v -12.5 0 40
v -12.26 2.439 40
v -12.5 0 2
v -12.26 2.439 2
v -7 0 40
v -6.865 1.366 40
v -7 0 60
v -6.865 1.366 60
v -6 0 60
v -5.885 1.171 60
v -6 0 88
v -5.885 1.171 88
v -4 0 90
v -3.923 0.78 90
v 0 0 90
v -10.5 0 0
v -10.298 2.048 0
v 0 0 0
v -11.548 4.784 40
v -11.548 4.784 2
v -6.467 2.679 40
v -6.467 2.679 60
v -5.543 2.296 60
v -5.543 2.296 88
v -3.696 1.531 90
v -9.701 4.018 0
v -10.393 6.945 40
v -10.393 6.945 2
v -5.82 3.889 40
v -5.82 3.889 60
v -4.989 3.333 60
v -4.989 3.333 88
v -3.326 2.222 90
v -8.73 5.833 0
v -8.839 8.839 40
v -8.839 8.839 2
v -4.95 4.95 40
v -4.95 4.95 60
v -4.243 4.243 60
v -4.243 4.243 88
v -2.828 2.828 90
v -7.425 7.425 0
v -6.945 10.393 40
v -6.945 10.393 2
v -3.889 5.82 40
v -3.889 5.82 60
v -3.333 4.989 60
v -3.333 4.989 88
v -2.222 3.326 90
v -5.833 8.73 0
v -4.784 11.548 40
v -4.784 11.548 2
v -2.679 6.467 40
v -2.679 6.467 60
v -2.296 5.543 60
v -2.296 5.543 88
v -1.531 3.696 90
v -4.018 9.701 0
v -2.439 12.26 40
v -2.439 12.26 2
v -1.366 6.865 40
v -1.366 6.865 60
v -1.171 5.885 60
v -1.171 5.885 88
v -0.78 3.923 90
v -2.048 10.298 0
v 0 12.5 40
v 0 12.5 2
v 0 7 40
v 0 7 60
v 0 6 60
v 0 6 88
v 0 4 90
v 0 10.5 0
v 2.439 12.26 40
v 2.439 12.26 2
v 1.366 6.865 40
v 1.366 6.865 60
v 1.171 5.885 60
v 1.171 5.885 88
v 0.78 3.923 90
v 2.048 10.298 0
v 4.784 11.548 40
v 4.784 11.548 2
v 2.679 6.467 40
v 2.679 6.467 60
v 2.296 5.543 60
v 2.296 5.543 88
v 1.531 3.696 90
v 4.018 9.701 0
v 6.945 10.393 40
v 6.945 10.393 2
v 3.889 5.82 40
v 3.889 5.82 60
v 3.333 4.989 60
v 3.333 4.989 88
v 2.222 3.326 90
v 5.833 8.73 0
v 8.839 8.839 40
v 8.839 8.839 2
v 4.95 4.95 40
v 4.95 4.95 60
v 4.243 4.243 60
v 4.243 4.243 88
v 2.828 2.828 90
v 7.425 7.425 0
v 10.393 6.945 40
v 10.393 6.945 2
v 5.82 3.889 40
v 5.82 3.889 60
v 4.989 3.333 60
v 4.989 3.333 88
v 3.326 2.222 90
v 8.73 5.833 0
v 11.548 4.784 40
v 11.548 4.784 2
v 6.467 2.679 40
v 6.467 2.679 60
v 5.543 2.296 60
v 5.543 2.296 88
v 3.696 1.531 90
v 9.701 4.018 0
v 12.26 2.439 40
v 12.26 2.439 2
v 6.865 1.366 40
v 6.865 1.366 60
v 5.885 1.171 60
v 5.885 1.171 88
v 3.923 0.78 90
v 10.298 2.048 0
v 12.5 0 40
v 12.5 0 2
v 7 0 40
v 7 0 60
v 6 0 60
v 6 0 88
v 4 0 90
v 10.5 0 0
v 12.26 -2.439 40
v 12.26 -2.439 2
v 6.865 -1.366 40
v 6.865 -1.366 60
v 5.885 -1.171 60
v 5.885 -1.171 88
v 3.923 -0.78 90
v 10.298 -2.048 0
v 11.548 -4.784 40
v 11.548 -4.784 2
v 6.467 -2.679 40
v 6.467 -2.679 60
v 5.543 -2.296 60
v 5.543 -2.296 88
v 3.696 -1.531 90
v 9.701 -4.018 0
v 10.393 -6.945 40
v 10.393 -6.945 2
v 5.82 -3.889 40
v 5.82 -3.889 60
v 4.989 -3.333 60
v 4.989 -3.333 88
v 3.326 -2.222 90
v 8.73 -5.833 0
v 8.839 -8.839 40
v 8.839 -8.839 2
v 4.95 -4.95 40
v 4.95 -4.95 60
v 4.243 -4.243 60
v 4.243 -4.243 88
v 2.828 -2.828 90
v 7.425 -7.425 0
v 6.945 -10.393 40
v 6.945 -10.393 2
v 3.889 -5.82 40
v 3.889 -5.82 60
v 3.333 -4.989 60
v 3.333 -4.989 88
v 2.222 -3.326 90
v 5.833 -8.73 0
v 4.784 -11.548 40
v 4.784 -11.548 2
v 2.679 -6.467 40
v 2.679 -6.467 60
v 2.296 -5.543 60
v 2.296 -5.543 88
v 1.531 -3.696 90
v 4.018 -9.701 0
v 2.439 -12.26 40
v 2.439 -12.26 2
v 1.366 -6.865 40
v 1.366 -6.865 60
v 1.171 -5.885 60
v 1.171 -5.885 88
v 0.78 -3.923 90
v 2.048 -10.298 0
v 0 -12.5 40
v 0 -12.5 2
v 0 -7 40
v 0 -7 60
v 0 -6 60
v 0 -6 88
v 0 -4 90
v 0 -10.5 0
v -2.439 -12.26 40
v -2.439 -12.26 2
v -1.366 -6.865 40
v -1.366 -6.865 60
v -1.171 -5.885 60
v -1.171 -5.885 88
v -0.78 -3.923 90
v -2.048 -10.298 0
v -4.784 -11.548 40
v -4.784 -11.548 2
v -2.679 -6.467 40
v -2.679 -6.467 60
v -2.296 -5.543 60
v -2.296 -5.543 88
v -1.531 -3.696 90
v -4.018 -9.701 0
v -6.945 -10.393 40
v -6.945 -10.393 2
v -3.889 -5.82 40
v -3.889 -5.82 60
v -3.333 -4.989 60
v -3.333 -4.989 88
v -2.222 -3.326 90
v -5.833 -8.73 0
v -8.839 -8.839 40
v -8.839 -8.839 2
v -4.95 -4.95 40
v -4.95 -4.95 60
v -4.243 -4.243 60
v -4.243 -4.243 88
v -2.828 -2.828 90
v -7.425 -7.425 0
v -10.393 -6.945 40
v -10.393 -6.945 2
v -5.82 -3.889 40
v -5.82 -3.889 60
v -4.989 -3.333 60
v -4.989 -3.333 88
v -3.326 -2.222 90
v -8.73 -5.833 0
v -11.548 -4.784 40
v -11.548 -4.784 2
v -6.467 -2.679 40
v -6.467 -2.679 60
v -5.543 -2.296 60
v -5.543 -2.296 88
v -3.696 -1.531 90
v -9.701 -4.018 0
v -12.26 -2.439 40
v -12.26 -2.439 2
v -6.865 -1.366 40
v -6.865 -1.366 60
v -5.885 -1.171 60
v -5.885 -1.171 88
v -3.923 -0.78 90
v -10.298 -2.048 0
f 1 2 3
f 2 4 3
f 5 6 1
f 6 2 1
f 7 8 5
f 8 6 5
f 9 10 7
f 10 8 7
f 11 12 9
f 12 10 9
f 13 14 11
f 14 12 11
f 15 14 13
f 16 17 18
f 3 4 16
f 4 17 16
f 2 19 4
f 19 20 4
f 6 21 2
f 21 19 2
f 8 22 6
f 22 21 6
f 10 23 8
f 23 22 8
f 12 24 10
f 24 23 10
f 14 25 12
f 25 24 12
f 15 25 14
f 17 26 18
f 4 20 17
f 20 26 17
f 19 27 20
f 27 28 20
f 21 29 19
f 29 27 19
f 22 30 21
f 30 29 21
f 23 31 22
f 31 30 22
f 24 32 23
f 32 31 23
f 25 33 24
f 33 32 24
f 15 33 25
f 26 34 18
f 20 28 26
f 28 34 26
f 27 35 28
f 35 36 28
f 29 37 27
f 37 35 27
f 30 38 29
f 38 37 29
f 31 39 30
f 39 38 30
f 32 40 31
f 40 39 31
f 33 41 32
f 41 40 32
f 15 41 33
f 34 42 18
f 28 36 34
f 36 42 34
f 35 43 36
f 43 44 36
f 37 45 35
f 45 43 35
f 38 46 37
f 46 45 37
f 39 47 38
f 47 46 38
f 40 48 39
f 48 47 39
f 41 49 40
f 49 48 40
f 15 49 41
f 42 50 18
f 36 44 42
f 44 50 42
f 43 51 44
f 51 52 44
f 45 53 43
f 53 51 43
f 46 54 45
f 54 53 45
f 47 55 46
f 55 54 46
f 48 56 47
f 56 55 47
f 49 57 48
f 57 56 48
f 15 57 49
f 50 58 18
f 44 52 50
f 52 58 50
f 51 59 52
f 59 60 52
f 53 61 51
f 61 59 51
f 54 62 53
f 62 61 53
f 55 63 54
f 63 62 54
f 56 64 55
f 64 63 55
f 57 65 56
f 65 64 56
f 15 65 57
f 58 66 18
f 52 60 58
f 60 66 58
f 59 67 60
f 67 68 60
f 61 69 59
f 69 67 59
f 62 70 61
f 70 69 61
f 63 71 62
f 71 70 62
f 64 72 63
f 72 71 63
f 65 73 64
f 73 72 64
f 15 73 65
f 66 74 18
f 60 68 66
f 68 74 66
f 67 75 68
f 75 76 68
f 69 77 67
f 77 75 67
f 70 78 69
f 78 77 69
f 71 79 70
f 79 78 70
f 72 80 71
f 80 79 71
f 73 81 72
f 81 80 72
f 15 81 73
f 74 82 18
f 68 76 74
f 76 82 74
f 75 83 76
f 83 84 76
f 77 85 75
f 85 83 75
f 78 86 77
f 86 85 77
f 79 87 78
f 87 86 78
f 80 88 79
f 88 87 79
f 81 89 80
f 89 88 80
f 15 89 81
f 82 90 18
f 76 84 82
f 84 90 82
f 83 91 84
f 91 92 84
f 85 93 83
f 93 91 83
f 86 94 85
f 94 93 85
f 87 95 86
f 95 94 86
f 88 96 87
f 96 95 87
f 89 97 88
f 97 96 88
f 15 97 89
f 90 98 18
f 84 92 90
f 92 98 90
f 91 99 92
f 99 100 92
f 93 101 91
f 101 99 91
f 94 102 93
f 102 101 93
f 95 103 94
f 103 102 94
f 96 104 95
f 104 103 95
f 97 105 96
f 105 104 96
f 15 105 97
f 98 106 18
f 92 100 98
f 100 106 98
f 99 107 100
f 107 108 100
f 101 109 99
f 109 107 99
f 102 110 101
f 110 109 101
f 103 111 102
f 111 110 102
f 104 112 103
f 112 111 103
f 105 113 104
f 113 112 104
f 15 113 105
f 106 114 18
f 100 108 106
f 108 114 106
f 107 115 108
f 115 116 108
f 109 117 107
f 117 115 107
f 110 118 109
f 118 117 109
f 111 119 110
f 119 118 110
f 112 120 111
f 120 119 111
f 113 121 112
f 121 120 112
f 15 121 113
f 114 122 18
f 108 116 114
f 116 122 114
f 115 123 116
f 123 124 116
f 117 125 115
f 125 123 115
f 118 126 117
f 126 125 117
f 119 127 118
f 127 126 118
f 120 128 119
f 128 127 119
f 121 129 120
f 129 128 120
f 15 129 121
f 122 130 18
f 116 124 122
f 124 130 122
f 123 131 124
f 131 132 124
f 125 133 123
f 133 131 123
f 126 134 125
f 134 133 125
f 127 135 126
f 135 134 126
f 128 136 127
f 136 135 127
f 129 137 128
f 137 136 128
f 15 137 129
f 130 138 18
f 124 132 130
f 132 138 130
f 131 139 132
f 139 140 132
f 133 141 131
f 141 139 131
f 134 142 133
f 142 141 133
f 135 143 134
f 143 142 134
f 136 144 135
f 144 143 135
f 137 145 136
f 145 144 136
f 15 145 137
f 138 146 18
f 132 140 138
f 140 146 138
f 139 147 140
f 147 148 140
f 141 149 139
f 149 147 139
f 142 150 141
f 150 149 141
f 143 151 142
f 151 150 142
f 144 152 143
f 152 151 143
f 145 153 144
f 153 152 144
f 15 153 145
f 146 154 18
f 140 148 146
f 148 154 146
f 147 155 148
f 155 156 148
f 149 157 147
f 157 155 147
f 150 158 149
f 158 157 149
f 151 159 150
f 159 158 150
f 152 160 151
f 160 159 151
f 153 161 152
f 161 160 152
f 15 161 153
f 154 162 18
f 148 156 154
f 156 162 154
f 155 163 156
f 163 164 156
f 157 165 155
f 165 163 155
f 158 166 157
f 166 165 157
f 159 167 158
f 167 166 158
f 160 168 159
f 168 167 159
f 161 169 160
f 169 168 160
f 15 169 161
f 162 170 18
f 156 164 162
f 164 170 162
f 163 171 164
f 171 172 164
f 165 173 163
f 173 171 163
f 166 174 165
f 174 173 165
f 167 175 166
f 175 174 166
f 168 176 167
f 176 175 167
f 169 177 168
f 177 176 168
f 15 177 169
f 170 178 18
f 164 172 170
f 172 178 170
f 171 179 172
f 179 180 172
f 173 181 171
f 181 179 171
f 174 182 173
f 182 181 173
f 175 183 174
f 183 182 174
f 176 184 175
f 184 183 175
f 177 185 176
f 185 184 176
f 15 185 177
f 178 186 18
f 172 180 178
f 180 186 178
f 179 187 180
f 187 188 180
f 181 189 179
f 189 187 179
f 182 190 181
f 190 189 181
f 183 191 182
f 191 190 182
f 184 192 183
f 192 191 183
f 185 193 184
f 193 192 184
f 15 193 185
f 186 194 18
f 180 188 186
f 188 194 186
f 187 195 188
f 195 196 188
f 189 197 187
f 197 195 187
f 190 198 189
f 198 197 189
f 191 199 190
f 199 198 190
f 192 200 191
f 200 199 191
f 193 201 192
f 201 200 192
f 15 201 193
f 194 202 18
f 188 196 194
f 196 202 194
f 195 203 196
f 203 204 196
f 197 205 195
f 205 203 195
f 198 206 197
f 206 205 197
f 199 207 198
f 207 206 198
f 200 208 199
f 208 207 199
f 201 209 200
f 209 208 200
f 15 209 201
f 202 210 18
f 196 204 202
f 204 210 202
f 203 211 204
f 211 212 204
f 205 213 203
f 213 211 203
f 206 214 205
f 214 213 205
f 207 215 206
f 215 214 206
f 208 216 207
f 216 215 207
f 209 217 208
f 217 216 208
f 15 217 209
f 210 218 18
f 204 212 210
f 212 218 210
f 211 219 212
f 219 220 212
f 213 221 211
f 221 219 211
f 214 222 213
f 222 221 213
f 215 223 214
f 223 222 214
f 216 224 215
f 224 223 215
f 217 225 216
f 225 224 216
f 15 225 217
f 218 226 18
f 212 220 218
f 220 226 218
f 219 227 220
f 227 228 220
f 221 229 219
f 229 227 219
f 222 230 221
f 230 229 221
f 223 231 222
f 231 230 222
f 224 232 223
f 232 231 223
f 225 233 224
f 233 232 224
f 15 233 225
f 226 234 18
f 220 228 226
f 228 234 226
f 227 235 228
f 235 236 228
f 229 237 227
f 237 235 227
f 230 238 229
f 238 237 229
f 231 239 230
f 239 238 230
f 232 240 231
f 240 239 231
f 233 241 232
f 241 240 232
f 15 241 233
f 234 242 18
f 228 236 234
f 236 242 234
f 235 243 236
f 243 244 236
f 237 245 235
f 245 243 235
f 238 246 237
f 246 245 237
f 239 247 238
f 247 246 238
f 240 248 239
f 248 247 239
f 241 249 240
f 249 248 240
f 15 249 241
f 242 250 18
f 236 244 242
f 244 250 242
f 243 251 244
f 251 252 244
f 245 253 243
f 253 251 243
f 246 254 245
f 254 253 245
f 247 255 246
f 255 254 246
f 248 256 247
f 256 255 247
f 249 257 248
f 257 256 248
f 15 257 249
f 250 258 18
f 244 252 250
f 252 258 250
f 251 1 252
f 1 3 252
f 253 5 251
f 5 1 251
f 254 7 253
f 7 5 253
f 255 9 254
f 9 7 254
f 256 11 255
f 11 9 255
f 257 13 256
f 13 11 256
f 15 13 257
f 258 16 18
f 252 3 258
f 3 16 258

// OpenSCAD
$fn = 32;

// ----------------------------------------------------------------------
// Stepped shaft: diameters 25, 14, 12 mm, 90 mm long
// ----------------------------------------------------------------------

// --- parameters (mm) ---
d1 = 25;                  // step 1 diameter
len1 = 40;                // step 1 length
d2 = 14;                  // step 2 diameter
len2 = 20;                // step 2 length
d3 = 12;                  // step 3 diameter
len3 = 30;                // step 3 length
total = 90;               // overall length
chamfer = 2;              // end chamfer

/* closed turning profile: x is the radius, y is the length */
profile = [[0, 0], [12.5 - chamfer, 0], [12.5, chamfer], [12.5, 40], [7, 40], [7, 60], [6, 60], [6, 88], [4, 90], [0, 90]];

difference() {
  rotate_extrude() polygon(profile);
}
